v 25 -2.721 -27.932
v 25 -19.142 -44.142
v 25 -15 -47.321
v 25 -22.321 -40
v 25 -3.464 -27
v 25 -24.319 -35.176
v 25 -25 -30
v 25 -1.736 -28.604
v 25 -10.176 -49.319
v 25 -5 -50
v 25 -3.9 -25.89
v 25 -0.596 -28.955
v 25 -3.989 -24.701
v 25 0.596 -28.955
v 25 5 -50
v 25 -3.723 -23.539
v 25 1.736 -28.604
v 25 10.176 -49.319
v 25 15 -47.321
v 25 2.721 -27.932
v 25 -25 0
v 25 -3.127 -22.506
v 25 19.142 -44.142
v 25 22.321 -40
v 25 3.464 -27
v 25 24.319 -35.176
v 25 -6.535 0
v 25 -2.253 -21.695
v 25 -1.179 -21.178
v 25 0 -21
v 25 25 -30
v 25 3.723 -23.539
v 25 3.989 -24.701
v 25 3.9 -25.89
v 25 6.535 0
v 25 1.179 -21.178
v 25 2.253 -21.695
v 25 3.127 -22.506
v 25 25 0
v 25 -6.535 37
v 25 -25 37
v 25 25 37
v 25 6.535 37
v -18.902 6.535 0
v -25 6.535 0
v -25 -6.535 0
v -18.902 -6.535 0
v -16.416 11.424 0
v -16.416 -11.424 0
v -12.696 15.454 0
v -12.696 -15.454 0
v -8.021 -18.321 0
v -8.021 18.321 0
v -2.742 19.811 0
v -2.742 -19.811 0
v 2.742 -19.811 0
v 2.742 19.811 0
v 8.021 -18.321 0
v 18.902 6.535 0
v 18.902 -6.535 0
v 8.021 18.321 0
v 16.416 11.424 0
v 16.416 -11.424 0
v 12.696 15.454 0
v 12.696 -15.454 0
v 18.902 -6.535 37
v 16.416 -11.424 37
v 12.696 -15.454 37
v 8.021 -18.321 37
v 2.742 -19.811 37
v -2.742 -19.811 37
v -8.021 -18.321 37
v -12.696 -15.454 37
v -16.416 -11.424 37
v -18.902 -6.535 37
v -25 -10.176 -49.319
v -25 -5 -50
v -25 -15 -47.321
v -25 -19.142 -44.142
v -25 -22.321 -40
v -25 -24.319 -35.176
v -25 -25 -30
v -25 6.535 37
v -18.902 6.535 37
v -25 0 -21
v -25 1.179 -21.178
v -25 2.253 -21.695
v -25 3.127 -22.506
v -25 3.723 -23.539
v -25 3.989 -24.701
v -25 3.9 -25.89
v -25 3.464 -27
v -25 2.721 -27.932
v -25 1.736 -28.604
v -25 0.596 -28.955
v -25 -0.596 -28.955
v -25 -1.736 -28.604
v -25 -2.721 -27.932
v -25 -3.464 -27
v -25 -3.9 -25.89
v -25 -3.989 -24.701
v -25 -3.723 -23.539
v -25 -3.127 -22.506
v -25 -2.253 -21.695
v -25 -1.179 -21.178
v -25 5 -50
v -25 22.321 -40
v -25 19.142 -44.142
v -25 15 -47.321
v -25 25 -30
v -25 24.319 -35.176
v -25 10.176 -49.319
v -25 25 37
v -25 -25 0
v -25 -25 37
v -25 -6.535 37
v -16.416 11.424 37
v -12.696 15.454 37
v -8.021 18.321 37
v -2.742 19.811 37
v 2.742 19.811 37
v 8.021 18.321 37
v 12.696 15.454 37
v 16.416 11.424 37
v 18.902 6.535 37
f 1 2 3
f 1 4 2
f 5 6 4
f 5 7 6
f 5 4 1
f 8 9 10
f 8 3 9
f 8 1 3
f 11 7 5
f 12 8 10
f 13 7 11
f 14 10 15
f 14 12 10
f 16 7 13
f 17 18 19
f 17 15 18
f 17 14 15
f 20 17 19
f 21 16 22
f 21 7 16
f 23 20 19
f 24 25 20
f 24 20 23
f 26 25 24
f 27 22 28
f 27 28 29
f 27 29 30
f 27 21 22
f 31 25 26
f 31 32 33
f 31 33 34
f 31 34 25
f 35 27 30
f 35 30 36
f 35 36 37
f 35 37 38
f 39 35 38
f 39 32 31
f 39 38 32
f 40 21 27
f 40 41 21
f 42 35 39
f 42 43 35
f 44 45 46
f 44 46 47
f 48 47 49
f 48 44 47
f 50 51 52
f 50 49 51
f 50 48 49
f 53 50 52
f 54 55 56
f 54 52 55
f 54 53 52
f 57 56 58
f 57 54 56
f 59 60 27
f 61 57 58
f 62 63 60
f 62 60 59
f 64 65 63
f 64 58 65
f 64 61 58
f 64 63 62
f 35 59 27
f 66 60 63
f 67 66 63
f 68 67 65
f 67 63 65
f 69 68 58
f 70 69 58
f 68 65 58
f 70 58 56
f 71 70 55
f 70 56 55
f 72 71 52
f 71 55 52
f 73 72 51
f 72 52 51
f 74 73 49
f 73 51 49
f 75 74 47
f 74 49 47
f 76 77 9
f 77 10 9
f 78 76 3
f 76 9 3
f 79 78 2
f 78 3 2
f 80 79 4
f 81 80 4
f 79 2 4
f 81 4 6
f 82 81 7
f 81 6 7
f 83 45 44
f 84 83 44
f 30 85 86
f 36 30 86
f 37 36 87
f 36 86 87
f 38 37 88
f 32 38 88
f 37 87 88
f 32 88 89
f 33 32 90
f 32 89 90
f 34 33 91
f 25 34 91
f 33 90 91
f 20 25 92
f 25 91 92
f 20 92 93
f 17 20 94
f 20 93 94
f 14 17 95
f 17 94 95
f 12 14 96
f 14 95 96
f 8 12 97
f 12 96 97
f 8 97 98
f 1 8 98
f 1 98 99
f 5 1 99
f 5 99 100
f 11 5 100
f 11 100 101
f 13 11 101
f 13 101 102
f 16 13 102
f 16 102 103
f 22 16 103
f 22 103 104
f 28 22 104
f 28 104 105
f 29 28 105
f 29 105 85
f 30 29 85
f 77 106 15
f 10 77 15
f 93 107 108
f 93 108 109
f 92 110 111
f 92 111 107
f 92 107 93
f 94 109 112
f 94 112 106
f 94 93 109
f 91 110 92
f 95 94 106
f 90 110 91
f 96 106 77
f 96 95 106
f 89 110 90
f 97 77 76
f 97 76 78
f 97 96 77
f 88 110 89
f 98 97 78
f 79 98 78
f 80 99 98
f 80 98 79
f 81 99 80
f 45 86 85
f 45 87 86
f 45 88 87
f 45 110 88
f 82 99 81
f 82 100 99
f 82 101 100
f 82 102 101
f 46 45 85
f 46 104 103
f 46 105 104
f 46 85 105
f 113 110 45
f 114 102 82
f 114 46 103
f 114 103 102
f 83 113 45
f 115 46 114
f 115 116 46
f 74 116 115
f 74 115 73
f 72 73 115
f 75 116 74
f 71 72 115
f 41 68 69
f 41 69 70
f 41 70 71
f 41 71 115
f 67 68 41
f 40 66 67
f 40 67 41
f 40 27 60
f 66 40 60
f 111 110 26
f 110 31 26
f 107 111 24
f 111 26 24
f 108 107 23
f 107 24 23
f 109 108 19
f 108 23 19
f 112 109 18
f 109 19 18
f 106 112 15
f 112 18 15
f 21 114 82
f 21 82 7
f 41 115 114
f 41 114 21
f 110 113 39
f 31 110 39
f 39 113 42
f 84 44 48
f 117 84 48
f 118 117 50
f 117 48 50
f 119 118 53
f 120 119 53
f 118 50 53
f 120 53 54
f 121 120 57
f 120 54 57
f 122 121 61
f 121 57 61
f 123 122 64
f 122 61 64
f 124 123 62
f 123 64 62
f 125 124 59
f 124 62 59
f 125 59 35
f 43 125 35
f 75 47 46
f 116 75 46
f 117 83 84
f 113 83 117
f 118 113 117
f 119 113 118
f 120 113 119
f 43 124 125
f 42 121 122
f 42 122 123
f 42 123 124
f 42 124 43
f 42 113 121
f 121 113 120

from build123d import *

# Parameters (mm, degrees)
EXTRUDE_1_DEPTH     = 37
EXTRUDE_1_2_DEPTH   = 37
SKETCH_1_4_W        = 50
SKETCH_1_4_H        = 50
EXTRUDE_2_DEPTH     = 50
SKETCH_3_R          = 4
CUT_EXTRUDE_1_DEPTH = 54
FILLET_1_R          = 20


with BuildPart() as part:
    # 스케치1 → 보스-돌출1 (new body)
    with BuildSketch(Plane.XY):
        with BuildLine():
            Line((-25, 25), (-25, 6.535008171))
            Line((-25, 6.535008171), (-18.902213315, 6.535008171))
            ThreePointArc((-18.902213315, 6.535008171), (0, 20), (18.902213315, 6.535008171))
            Line((18.902213315, 6.535008171), (25, 6.535008171))
            Line((25, 6.535008171), (25, 25))
            Line((25, 25), (-25, 25))
        make_face()
    extrude(amount=EXTRUDE_1_DEPTH)



with BuildPart() as body_2:
    # 스케치1 → Extrude 1 2 (new body)
    with BuildSketch(Plane.XY):
        with BuildLine():
            Line((-18.902213315, -6.535008171), (-25, -6.535008171))
            Line((-25, -6.535008171), (-25, -25))
            Line((-25, -25), (25, -25))
            Line((25, -25), (25, -6.535008171))
            Line((25, -6.535008171), (18.902213315, -6.535008171))
            ThreePointArc((18.902213315, -6.535008171), (0, -20), (-18.902213315, -6.535008171))
        make_face()
    extrude(amount=EXTRUDE_1_2_DEPTH)


with BuildPart() as part_1:
    add(part.part)

    add(body_2.part)  # 보스-돌출2 merges body 2
    # 스케치1<4> → 보스-돌출2 (add)
    with BuildSketch(Plane.XY):
        Rectangle(SKETCH_1_4_W, SKETCH_1_4_H)
    extrude(amount=-EXTRUDE_2_DEPTH)

    # 스케치3 → 컷-돌출1 (cut)
    with BuildSketch(Plane.ZY.offset(25)):
        with Locations((-25, 0)):
            Circle(SKETCH_3_R)
    extrude(amount=-CUT_EXTRUDE_1_DEPTH, mode=Mode.SUBTRACT)

    # 필렛1
    fillet_1_edges = [part_1.edges().sort_by_distance(p)[0] for p in [
        (0, -25, -50),
        (0, 25, -50),
    ]]
    fillet(fillet_1_edges, radius=FILLET_1_R)


solid = part_1.part
